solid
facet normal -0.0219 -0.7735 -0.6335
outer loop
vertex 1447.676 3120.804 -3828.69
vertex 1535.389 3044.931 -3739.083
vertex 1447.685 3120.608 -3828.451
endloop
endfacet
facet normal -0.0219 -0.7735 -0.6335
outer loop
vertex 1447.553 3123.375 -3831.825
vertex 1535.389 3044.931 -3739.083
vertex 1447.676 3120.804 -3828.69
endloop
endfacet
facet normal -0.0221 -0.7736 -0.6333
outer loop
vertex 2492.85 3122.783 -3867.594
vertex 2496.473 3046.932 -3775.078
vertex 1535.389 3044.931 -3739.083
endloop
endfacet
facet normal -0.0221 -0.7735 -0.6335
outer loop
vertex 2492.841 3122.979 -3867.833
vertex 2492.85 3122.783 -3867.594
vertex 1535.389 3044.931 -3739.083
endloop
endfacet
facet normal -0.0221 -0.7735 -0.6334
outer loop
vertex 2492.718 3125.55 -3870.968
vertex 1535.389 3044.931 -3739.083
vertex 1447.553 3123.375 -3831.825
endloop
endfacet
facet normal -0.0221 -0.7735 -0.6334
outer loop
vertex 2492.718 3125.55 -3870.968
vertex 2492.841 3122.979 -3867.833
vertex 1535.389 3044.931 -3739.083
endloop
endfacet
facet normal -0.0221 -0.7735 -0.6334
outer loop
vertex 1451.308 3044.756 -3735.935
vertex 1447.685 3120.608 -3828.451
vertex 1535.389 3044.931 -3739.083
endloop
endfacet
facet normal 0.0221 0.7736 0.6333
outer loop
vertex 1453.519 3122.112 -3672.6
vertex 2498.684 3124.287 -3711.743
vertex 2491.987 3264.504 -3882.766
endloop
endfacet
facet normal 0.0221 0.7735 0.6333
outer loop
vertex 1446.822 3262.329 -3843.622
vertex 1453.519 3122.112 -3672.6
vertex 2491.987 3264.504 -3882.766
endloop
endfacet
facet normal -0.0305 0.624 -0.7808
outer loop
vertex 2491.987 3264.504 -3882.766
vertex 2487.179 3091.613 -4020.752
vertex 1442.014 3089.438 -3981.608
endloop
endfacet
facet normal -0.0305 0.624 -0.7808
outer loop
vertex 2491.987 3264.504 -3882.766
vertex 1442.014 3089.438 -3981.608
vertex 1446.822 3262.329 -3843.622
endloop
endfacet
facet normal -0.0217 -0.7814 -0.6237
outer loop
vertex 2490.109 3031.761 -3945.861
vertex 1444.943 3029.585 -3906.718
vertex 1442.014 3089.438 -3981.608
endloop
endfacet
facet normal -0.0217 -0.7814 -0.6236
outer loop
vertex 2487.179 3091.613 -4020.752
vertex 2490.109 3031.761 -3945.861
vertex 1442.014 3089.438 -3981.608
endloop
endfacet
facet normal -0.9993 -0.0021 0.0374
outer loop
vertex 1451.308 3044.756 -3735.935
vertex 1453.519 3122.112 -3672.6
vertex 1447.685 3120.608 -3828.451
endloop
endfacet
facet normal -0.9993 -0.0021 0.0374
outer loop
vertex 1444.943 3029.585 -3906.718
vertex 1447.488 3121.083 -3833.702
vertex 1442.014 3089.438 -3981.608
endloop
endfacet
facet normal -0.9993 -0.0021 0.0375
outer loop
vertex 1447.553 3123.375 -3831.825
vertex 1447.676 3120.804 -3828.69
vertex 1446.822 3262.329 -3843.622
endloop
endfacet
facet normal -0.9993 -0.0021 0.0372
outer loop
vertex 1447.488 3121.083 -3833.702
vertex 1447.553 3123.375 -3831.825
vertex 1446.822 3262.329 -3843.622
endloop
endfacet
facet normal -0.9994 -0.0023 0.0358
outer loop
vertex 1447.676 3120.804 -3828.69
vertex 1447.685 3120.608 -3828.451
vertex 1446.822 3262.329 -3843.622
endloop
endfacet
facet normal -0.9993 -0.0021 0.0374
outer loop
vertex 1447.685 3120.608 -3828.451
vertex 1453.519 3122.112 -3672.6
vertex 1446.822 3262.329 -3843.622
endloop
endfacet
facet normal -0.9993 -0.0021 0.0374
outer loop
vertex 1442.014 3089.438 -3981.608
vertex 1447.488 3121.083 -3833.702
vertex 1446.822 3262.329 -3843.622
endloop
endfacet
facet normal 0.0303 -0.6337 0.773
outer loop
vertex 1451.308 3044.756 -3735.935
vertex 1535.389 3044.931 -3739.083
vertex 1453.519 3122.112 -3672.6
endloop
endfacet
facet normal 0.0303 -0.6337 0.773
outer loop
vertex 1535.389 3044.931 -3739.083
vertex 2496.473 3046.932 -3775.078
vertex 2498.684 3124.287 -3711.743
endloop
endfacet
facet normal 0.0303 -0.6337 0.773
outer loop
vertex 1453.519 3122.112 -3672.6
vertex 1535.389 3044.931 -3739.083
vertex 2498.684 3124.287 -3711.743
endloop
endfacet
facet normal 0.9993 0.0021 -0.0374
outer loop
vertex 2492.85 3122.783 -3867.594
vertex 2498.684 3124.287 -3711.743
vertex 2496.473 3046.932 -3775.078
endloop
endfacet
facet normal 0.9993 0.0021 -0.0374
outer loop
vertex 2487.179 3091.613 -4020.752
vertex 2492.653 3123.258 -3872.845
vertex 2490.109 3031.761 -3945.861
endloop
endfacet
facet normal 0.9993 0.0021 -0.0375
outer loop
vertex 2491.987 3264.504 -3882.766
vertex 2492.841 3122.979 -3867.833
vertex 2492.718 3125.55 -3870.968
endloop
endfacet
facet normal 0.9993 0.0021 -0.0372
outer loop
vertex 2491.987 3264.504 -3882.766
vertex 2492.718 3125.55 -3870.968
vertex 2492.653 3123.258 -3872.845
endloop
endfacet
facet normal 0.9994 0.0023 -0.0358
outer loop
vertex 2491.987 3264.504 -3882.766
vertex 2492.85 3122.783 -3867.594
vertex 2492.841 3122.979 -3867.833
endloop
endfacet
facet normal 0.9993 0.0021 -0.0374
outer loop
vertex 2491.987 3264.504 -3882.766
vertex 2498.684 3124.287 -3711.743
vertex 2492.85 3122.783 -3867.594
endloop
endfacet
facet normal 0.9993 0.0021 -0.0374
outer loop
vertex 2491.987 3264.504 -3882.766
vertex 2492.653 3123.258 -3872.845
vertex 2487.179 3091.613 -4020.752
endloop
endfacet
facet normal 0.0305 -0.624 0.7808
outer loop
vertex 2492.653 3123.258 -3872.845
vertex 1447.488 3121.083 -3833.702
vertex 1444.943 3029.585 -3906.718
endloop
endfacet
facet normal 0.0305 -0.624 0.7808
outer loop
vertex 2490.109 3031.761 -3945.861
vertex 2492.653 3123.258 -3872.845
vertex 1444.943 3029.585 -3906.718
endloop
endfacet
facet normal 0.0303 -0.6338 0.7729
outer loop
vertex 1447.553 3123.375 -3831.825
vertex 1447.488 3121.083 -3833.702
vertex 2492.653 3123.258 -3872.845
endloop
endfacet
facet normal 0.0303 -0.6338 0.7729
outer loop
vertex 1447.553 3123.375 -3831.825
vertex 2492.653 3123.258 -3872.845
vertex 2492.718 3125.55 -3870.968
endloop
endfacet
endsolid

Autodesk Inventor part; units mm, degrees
sketch "Sketch1" plane through (0, 0, 0) normal (0, 0, 1) x (1, 0, 0)
  arc A0 (4796.3585, -1909.6289) -> (3343.4744, 1121.5056) centre (-3903.1767, -4215.7265) ccw
  line L0 (3236.8192, 1046.7661) -> (3343.5051, 1121.464)
  arc A1 (3228.7635, 1285.3391) -> (1546.1726, 3076.3751) centre (-4110.5601, -3923.7232) ccw
  line L1 (3228.7635, 1285.3391) -> (3122.0787, 1210.6419)
  line L2 (1372.9503, 3176.3452) -> (1308.1705, 3064.1503)
  arc A2 (1372.9503, 3176.3452) -> (93.8576, 4024.2684) centre (-4221.2651, -3873.8147) ccw
  line L3 (1481.3729, 2964.1457) -> (1546.1726, 3076.3751)
  arc A3 (4543.4821, -2147.4888) -> (93.8528, 3844.2289) centre (-4256.4671, -4034.5221) ccw
  line L4 (93.8576, 4024.2684) -> (93.8528, 3844.2289)
  line L5 (1308.1705, 3064.1503) -> (1481.3729, 2964.1457)
  line L6 (3122.0787, 1210.6419) -> (3236.8192, 1046.7661)
  arc A4 (4543.4821, -2147.4888) -> (4796.3585, -1909.6289) centre (4134.8595, -1459.7188) ccw
  point P0 (0, 0)
  dimension "d7" = 800
ref_plane "Work Plane2" through (0, 0, -8101) normal (0, 0, 1) x (1, 0, 0)
ref_plane "Work Plane1" through (0, 0, 0) normal (0, 0, 1) x (1, 0, 0)
sketch "Sketch2" plane through (0, 0, -8101) normal (0, 0, 1) x (1, 0, 0)
  arc A0 (1192.0552, 3508.338) -> (93.8528, 4294.485) centre (-5164.5547, -4211.3454) ccw projected
  arc A1 (3133.8513, 1483.0798) -> (1365.2603, 3408.338) centre (-5051.6105, -4261.3276) ccw projected
  arc A2 (4543.6426, -2147.8414) -> (93.8528, 4114.0508) centre (-5207.4444, -4365.1147) ccw projected
  line L0 (1192.0552, 3508.338) -> (1126.9741, 3395.6142) projected
  line L1 (1365.2603, 3408.338) -> (1300.1792, 3295.6142) projected
  line L2 (1126.9741, 3395.6142) -> (1300.1792, 3295.6142) projected
  line L3 (93.8528, 4294.485) -> (93.8528, 4114.0508) projected
  line L4 (3027.6129, 1408.6909) -> (3133.8513, 1483.0798) projected
  line L5 (3142.3282, 1244.8605) -> (3248.5665, 1319.2494) projected
  line L6 (3027.6129, 1408.6909) -> (3142.3282, 1244.8605) projected
  arc A3 (4803.6655, -1899.2732) -> (3248.5665, 1319.2494) centre (-4832.968, -4570.4704) ccw projected
  arc A4 (4543.6426, -2147.8414) -> (4803.6655, -1899.2732) centre (4135.0016, -1460.0824) ccw projected
  point P0 (0, 0)
loft "Loft1" add profiles "Sketch1", "Sketch2"
ref_plane "Work Plane3" through (2600, 0, 0) normal (1, 0, 0) x (0, 1, 0)
sketch "Sketch3" plane through (2600, 0, 0) normal (1, 0, 0) x (0, 1, 0)
  line L0 (3120.8038, -3828.6818) -> (2179.9067, -2717.5683)
  line L1 (2179.9067, -2717.5683) -> (2281.1646, -4539.693)
  line L2 (2281.1646, -4539.693) -> (3120.8038, -3828.6818)
  line L3 (4534.6211, 332.5956) -> (-2270.5383, 332.5956)
  line L4 (-2270.5383, 332.5956) -> (-2270.5383, -8394.1003)
  line L5 (-2270.5383, -8394.1003) -> (4534.6211, -8394.1003)
  line L6 (4534.6211, -8394.1003) -> (4534.6211, 332.5956)
  point P0 (0, 0)
extrude "Extrusion1" cut sketch "Sketch3" along normal through all both and the other way through all
sketch "Sketch5" plane through (2219.0112, 2281.1646, -4539.693) normal (0, -0.9984595, -0.0554857) x (1, 0, 0)
  line L0 (318.8718, 1824.936) -> (250.4195, 0)
  point P0 (-2219.0112, 4659.2715)
ref_plane "Work Plane4" through (2537.8831, 2179.9067, -2717.5683) normal (-0.6423359, -0.7662012, -0.0184479) x (-0.0374831, 0.0554467, -0.9977578)
sketch "Sketch6" plane through (2537.8831, 2179.9067, -2717.5683) normal (-0.6423359, -0.7662012, -0.0184479) x (-0.0374831, 0.0554467, -0.9977578)
  line L0 (-729.0595, -1938.3665) -> (2085.591, -1938.3665)
  line L1 (2085.591, -1938.3665) -> (2085.591, 179.9667)
  line L2 (2085.591, 179.9667) -> (-729.0595, 179.9667)
  line L3 (-729.0595, 179.9667) -> (-729.0595, -1938.3665)
  point P0 (-2737.216, -722.0143)
extrude "Extrusion2" cut sketch "Sketch6" against normal through all
ref_plane "Work Plane5" through (2537.8831, 2179.9067, -2717.5683) normal (-0.9992973, -0.0020798, 0.0374254) x (-0.0374831, 0.0554467, -0.9977578)
sketch "Sketch7" plane through (2537.8831, 2179.9067, -2717.5683) normal (-0.9992973, -0.0020798, 0.0374254) x (-0.0374831, 0.0554467, -0.9977578)
  line L0 (1826.2193, 0) -> (0, 0) projected
  line L1 (1201.6643, -877.7967) -> (1826.2193, 0) projected
  line L2 (0, 0) -> (1201.6643, -877.7967) projected
  point P0 (-2737.216, 2025.7624)
sketch "Sketch8" plane through (2537.8831, 2179.9067, -2717.5683) normal (-0.6423359, -0.7662012, -0.0184479) x (-0.0374831, 0.0554467, -0.9977578)
  line L0 (1826.2193, 0) -> (0, 0) projected
  line L1 (1201.6643, -1365.6093) -> (1826.2193, 0) projected
  line L2 (0, 0) -> (1201.6643, -1365.6093) projected
  point P0 (-2737.216, -722.0143)
loft "Loft2" add profiles "Sketch7" section 1 edges at (2503.6569, 2230.5357, -3628.6306) (1958.4447, 2700.9842, -4184.1874) (1992.6709, 2650.3553, -3273.125)
sketch "Sketch9" plane through (2537.8831, 2179.9067, -2717.5683) normal (0.9992973, 0.0020798, -0.0374254) x (-0.0374831, 0.0554467, -0.9977578)
  line L0 (1201.6643, 877.7967) -> (0, 0) projected
  line L1 (1826.2193, 0) -> (1201.6643, 877.7967) projected
  line L2 (1201.6643, 877.7967) -> (1104.7642, 807.0127)
  line L3 (1201.6643, 877.7967) -> (1271.2326, 780.0202)
  line L4 (1271.2326, 780.0202) -> (1352.713, 837.9938)
  line L5 (1104.7642, 807.0127) -> (1045.7775, 887.7628)
  line L6 (1045.7775, 887.7628) -> (1224.4425, 1018.2748)
  line L7 (1352.713, 837.9938) -> (1224.4425, 1018.2748)
  point P0 (-2737.216, -2025.7624)
  dimension "d23" = 120
  dimension "d24" = 120
  dimension "d25" = 100
  dimension "d26" = 100
extrude "Extrusion3" add sketch "Sketch9" against normal blind 1045.9
sketch "Sketch10" plane through (2537.8831, 2179.9067, -2717.5683) normal (0.9992973, 0.0020798, -0.0374254) x (-0.0374831, 0.0554467, -0.9977578)
  spline S0 degree 5 poles (1206.6873, 877.7967) (1235.6092, 837.1011) (1264.8055, 796.0647) (1294.2703, 754.695) (1323.9982, 712.9995) (1384.2838, 628.5301) (1414.847, 585.7495) (1445.6675, 542.6512) (1476.7397, 499.2425) (1539.6833, 411.3906) (1571.5596, 366.9415) (1603.6814, 322.1905) (1636.0432, 277.145) (1701.5649, 186.0221) (1734.7295, 139.9388) (1768.128, 93.5694) (1801.7552, 46.9208) (1835.6058, 0) knots 0 0 0 0 0 0 0.246209 0.246209 0.246209 0.246209 0.495004 0.495004 0.495004 0.495004 0.746236 0.746236 0.746236 0.746236 1 1 1 1 1 1 projected
  line L0 (1104.7642, 807.0127) -> (0, 0) projected
  line L1 (1826.2193, 0) -> (0, 0) projected
  line L2 (1835.6058, 0) -> (1826.2193, 0) projected
  line L3 (1104.7642, 807.0127) -> (1204.9396, 880.1893)
  line L4 (1201.4146, 877.6143) -> (1104.7642, 807.0127) projected
  line L5 (1206.6873, 877.7967) -> (1204.9396, 880.1893)
  point P0 (-2737.216, -2025.7624)
extrude "Extrusion4" cut sketch "Sketch10" against normal blind 2000
properties part number "panel_block_03" material "Wood (Maple)"
